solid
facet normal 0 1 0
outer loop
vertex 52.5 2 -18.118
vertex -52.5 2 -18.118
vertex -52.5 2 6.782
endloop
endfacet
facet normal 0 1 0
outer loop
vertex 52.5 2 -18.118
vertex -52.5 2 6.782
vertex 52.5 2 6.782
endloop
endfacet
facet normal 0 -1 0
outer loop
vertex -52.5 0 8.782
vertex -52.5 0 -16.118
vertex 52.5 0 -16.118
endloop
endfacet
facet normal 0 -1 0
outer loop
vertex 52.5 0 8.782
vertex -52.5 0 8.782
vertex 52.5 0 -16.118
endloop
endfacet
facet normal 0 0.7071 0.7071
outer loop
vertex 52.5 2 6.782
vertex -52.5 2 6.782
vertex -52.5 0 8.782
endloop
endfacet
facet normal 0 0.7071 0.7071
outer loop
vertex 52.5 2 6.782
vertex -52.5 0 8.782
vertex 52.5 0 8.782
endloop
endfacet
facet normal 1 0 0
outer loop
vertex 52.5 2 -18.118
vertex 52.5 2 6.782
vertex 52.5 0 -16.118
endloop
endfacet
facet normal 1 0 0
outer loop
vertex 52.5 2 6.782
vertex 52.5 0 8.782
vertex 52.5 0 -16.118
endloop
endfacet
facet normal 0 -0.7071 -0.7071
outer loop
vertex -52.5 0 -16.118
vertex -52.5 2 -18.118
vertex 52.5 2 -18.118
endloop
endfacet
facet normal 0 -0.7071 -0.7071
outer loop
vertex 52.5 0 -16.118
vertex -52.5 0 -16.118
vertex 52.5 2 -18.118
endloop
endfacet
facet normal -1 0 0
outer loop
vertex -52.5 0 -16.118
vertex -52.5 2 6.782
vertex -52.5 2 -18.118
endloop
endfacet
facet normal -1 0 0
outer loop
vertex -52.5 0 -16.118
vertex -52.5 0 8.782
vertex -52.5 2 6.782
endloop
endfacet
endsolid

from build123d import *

# Parameters (mm, degrees)
SKETCH2_W           = 105
SKETCH2_H           = 26.9
BOSS_EXTRUDE1_DEPTH = 2
CHAMFER1_SIZE       = 2
CHAMFER2_SIZE       = 2


with BuildPart() as part:
    # Sketch2 → Boss-Extrude1 (new body)
    with BuildSketch(Plane(origin=(0, 0, 0), x_dir=(1, 0, 0), z_dir=(0, 1, 0))):
        with Locations((0, 4.668100445)):
            Rectangle(SKETCH2_W, SKETCH2_H)
    extrude(amount=BOSS_EXTRUDE1_DEPTH)

    # Chamfer1
    chamfer1_edges = [part.edges().sort_by_distance(p)[0] for p in [
        (0, 2, 8.781899555),
    ]]
    chamfer(chamfer1_edges, length=CHAMFER1_SIZE - 0.0001)  # a hair under: the kernel refuses the full size

    # Chamfer2
    chamfer2_edges = [part.edges().sort_by_distance(p)[0] for p in [
        (0, 0, -18.118100445),
    ]]
    chamfer(chamfer2_edges, length=CHAMFER2_SIZE - 0.0001)  # a hair under: the kernel refuses the full size


solid = part.part
